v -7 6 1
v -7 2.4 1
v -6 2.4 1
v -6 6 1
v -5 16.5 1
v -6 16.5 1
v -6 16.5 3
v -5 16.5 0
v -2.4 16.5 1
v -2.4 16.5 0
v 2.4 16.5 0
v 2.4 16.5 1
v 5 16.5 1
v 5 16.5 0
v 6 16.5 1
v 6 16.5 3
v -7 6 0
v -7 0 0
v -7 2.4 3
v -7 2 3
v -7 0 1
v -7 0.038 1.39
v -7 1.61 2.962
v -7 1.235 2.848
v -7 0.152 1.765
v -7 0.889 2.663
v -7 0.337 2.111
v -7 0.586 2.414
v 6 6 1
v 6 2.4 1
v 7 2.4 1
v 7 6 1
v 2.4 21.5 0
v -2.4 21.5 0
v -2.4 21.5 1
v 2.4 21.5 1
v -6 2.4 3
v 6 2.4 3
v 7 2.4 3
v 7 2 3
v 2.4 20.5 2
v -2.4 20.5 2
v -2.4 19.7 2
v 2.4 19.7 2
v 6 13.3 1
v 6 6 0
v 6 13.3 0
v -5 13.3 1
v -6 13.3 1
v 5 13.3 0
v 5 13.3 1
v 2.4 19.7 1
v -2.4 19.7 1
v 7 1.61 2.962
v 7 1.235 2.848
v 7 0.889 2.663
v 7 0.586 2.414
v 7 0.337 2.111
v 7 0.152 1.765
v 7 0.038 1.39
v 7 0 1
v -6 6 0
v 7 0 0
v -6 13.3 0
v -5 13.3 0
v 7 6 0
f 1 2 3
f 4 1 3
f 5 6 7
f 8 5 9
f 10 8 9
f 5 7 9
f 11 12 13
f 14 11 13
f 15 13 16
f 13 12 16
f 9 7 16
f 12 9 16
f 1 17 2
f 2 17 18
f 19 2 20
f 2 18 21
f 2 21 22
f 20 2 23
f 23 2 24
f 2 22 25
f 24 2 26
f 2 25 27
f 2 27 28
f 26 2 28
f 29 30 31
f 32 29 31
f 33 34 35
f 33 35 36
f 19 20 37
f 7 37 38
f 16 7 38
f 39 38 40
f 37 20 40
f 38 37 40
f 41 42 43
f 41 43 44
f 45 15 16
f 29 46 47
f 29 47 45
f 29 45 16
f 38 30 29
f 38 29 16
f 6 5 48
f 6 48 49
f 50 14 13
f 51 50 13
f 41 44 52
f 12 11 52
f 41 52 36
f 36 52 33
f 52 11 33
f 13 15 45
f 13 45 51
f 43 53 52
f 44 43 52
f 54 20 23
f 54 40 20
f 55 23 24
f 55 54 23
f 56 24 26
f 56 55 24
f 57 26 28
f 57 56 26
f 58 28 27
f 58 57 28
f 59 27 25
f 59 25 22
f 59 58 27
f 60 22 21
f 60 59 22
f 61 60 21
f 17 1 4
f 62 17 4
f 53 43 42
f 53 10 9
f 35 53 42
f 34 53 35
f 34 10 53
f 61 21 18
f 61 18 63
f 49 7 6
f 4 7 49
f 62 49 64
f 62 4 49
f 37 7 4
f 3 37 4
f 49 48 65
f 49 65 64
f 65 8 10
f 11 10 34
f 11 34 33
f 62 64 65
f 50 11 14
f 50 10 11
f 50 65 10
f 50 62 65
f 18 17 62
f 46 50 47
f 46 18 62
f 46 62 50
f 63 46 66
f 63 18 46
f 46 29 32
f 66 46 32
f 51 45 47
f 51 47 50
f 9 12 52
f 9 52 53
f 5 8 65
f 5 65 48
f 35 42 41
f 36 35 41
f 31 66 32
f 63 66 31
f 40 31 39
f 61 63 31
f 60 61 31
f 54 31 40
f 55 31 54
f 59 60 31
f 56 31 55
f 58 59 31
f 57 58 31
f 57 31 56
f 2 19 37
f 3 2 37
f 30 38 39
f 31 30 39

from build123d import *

# Parameters (mm, degrees)
F0_W     = 12
F0_H     = 1
F0_H_2   = 2
F1_DEPTH = 16.5
F0_W_2   = 1
F2_DEPTH = 2.4
F3_DEPTH = 6
F4_R     = 2
F5_W     = 1
F5_H     = 1
F6_DEPTH = 3.2
F5_W_2   = 4.8
F7_DEPTH = 5
F8_W     = 4.8
F8_H     = 1.8
F9_DEPTH = 1
F10_SIZE = 1


with BuildPart() as f1:
    # F0 (on Front) → F1 (new body)
    with BuildSketch(Plane.XZ):
        with Locations((0, 0.5)):
            Rectangle(F0_W, F0_H)
        with Locations((0, 2)):
            Rectangle(F0_W, F0_H_2)
    extrude(amount=-F1_DEPTH)

    # F0 (on Front) → F2 (join)
    with BuildSketch(Plane.XZ):
        with Locations((-6.5, 2)):
            Rectangle(F0_W_2, F0_H_2)
        with Locations((6.5, 2)):
            Rectangle(F0_W_2, F0_H_2)
    extrude(amount=-F2_DEPTH)

    # F0 (on Front) → F3 (join)
    with BuildSketch(Plane.XZ):
        with Locations((6.5, 0.5)):
            Rectangle(F0_W_2, F0_H)
        with Locations((-6.5, 0.5)):
            Rectangle(F0_W_2, F0_H)
    extrude(amount=-F3_DEPTH)

    # F4
    f4_edges = [f1.edges().sort_by_distance(p)[0] for p in [
        (0, 0, 3),
    ]]
    fillet(f4_edges, radius=F4_R)

    # F5 (on face) → F6 (cut)
    with BuildSketch(Plane(origin=(0, 16.5, 0), x_dir=(-1, 0, 0), z_dir=(0, 1, 0))):
        with Locations((5.5, 0.5)):
            Rectangle(F5_W, F5_H)
        with Locations((-5.5, 0.5)):
            Rectangle(F5_W, F5_H)
    extrude(amount=-F6_DEPTH, mode=Mode.SUBTRACT)

    # F5 (on face) → F7 (join)
    with BuildSketch(Plane(origin=(0, 16.5, 0), x_dir=(-1, 0, 0), z_dir=(0, 1, 0))):
        with Locations((0, 0.5)):
            Rectangle(F5_W_2, F5_H)
    extrude(amount=F7_DEPTH)

    # F8 (on face) → F9 (join)
    with BuildSketch(Plane.XY.offset(1)):
        with Locations((0, 20.6)):
            Rectangle(F8_W, F8_H)
    extrude(amount=F9_DEPTH)

    # F10
    f10_edges = [f1.edges().sort_by_distance(p)[0] for p in [
        (0, 21.5, 2),
    ]]
    chamfer(f10_edges, length=F10_SIZE)


solid = f1.part
